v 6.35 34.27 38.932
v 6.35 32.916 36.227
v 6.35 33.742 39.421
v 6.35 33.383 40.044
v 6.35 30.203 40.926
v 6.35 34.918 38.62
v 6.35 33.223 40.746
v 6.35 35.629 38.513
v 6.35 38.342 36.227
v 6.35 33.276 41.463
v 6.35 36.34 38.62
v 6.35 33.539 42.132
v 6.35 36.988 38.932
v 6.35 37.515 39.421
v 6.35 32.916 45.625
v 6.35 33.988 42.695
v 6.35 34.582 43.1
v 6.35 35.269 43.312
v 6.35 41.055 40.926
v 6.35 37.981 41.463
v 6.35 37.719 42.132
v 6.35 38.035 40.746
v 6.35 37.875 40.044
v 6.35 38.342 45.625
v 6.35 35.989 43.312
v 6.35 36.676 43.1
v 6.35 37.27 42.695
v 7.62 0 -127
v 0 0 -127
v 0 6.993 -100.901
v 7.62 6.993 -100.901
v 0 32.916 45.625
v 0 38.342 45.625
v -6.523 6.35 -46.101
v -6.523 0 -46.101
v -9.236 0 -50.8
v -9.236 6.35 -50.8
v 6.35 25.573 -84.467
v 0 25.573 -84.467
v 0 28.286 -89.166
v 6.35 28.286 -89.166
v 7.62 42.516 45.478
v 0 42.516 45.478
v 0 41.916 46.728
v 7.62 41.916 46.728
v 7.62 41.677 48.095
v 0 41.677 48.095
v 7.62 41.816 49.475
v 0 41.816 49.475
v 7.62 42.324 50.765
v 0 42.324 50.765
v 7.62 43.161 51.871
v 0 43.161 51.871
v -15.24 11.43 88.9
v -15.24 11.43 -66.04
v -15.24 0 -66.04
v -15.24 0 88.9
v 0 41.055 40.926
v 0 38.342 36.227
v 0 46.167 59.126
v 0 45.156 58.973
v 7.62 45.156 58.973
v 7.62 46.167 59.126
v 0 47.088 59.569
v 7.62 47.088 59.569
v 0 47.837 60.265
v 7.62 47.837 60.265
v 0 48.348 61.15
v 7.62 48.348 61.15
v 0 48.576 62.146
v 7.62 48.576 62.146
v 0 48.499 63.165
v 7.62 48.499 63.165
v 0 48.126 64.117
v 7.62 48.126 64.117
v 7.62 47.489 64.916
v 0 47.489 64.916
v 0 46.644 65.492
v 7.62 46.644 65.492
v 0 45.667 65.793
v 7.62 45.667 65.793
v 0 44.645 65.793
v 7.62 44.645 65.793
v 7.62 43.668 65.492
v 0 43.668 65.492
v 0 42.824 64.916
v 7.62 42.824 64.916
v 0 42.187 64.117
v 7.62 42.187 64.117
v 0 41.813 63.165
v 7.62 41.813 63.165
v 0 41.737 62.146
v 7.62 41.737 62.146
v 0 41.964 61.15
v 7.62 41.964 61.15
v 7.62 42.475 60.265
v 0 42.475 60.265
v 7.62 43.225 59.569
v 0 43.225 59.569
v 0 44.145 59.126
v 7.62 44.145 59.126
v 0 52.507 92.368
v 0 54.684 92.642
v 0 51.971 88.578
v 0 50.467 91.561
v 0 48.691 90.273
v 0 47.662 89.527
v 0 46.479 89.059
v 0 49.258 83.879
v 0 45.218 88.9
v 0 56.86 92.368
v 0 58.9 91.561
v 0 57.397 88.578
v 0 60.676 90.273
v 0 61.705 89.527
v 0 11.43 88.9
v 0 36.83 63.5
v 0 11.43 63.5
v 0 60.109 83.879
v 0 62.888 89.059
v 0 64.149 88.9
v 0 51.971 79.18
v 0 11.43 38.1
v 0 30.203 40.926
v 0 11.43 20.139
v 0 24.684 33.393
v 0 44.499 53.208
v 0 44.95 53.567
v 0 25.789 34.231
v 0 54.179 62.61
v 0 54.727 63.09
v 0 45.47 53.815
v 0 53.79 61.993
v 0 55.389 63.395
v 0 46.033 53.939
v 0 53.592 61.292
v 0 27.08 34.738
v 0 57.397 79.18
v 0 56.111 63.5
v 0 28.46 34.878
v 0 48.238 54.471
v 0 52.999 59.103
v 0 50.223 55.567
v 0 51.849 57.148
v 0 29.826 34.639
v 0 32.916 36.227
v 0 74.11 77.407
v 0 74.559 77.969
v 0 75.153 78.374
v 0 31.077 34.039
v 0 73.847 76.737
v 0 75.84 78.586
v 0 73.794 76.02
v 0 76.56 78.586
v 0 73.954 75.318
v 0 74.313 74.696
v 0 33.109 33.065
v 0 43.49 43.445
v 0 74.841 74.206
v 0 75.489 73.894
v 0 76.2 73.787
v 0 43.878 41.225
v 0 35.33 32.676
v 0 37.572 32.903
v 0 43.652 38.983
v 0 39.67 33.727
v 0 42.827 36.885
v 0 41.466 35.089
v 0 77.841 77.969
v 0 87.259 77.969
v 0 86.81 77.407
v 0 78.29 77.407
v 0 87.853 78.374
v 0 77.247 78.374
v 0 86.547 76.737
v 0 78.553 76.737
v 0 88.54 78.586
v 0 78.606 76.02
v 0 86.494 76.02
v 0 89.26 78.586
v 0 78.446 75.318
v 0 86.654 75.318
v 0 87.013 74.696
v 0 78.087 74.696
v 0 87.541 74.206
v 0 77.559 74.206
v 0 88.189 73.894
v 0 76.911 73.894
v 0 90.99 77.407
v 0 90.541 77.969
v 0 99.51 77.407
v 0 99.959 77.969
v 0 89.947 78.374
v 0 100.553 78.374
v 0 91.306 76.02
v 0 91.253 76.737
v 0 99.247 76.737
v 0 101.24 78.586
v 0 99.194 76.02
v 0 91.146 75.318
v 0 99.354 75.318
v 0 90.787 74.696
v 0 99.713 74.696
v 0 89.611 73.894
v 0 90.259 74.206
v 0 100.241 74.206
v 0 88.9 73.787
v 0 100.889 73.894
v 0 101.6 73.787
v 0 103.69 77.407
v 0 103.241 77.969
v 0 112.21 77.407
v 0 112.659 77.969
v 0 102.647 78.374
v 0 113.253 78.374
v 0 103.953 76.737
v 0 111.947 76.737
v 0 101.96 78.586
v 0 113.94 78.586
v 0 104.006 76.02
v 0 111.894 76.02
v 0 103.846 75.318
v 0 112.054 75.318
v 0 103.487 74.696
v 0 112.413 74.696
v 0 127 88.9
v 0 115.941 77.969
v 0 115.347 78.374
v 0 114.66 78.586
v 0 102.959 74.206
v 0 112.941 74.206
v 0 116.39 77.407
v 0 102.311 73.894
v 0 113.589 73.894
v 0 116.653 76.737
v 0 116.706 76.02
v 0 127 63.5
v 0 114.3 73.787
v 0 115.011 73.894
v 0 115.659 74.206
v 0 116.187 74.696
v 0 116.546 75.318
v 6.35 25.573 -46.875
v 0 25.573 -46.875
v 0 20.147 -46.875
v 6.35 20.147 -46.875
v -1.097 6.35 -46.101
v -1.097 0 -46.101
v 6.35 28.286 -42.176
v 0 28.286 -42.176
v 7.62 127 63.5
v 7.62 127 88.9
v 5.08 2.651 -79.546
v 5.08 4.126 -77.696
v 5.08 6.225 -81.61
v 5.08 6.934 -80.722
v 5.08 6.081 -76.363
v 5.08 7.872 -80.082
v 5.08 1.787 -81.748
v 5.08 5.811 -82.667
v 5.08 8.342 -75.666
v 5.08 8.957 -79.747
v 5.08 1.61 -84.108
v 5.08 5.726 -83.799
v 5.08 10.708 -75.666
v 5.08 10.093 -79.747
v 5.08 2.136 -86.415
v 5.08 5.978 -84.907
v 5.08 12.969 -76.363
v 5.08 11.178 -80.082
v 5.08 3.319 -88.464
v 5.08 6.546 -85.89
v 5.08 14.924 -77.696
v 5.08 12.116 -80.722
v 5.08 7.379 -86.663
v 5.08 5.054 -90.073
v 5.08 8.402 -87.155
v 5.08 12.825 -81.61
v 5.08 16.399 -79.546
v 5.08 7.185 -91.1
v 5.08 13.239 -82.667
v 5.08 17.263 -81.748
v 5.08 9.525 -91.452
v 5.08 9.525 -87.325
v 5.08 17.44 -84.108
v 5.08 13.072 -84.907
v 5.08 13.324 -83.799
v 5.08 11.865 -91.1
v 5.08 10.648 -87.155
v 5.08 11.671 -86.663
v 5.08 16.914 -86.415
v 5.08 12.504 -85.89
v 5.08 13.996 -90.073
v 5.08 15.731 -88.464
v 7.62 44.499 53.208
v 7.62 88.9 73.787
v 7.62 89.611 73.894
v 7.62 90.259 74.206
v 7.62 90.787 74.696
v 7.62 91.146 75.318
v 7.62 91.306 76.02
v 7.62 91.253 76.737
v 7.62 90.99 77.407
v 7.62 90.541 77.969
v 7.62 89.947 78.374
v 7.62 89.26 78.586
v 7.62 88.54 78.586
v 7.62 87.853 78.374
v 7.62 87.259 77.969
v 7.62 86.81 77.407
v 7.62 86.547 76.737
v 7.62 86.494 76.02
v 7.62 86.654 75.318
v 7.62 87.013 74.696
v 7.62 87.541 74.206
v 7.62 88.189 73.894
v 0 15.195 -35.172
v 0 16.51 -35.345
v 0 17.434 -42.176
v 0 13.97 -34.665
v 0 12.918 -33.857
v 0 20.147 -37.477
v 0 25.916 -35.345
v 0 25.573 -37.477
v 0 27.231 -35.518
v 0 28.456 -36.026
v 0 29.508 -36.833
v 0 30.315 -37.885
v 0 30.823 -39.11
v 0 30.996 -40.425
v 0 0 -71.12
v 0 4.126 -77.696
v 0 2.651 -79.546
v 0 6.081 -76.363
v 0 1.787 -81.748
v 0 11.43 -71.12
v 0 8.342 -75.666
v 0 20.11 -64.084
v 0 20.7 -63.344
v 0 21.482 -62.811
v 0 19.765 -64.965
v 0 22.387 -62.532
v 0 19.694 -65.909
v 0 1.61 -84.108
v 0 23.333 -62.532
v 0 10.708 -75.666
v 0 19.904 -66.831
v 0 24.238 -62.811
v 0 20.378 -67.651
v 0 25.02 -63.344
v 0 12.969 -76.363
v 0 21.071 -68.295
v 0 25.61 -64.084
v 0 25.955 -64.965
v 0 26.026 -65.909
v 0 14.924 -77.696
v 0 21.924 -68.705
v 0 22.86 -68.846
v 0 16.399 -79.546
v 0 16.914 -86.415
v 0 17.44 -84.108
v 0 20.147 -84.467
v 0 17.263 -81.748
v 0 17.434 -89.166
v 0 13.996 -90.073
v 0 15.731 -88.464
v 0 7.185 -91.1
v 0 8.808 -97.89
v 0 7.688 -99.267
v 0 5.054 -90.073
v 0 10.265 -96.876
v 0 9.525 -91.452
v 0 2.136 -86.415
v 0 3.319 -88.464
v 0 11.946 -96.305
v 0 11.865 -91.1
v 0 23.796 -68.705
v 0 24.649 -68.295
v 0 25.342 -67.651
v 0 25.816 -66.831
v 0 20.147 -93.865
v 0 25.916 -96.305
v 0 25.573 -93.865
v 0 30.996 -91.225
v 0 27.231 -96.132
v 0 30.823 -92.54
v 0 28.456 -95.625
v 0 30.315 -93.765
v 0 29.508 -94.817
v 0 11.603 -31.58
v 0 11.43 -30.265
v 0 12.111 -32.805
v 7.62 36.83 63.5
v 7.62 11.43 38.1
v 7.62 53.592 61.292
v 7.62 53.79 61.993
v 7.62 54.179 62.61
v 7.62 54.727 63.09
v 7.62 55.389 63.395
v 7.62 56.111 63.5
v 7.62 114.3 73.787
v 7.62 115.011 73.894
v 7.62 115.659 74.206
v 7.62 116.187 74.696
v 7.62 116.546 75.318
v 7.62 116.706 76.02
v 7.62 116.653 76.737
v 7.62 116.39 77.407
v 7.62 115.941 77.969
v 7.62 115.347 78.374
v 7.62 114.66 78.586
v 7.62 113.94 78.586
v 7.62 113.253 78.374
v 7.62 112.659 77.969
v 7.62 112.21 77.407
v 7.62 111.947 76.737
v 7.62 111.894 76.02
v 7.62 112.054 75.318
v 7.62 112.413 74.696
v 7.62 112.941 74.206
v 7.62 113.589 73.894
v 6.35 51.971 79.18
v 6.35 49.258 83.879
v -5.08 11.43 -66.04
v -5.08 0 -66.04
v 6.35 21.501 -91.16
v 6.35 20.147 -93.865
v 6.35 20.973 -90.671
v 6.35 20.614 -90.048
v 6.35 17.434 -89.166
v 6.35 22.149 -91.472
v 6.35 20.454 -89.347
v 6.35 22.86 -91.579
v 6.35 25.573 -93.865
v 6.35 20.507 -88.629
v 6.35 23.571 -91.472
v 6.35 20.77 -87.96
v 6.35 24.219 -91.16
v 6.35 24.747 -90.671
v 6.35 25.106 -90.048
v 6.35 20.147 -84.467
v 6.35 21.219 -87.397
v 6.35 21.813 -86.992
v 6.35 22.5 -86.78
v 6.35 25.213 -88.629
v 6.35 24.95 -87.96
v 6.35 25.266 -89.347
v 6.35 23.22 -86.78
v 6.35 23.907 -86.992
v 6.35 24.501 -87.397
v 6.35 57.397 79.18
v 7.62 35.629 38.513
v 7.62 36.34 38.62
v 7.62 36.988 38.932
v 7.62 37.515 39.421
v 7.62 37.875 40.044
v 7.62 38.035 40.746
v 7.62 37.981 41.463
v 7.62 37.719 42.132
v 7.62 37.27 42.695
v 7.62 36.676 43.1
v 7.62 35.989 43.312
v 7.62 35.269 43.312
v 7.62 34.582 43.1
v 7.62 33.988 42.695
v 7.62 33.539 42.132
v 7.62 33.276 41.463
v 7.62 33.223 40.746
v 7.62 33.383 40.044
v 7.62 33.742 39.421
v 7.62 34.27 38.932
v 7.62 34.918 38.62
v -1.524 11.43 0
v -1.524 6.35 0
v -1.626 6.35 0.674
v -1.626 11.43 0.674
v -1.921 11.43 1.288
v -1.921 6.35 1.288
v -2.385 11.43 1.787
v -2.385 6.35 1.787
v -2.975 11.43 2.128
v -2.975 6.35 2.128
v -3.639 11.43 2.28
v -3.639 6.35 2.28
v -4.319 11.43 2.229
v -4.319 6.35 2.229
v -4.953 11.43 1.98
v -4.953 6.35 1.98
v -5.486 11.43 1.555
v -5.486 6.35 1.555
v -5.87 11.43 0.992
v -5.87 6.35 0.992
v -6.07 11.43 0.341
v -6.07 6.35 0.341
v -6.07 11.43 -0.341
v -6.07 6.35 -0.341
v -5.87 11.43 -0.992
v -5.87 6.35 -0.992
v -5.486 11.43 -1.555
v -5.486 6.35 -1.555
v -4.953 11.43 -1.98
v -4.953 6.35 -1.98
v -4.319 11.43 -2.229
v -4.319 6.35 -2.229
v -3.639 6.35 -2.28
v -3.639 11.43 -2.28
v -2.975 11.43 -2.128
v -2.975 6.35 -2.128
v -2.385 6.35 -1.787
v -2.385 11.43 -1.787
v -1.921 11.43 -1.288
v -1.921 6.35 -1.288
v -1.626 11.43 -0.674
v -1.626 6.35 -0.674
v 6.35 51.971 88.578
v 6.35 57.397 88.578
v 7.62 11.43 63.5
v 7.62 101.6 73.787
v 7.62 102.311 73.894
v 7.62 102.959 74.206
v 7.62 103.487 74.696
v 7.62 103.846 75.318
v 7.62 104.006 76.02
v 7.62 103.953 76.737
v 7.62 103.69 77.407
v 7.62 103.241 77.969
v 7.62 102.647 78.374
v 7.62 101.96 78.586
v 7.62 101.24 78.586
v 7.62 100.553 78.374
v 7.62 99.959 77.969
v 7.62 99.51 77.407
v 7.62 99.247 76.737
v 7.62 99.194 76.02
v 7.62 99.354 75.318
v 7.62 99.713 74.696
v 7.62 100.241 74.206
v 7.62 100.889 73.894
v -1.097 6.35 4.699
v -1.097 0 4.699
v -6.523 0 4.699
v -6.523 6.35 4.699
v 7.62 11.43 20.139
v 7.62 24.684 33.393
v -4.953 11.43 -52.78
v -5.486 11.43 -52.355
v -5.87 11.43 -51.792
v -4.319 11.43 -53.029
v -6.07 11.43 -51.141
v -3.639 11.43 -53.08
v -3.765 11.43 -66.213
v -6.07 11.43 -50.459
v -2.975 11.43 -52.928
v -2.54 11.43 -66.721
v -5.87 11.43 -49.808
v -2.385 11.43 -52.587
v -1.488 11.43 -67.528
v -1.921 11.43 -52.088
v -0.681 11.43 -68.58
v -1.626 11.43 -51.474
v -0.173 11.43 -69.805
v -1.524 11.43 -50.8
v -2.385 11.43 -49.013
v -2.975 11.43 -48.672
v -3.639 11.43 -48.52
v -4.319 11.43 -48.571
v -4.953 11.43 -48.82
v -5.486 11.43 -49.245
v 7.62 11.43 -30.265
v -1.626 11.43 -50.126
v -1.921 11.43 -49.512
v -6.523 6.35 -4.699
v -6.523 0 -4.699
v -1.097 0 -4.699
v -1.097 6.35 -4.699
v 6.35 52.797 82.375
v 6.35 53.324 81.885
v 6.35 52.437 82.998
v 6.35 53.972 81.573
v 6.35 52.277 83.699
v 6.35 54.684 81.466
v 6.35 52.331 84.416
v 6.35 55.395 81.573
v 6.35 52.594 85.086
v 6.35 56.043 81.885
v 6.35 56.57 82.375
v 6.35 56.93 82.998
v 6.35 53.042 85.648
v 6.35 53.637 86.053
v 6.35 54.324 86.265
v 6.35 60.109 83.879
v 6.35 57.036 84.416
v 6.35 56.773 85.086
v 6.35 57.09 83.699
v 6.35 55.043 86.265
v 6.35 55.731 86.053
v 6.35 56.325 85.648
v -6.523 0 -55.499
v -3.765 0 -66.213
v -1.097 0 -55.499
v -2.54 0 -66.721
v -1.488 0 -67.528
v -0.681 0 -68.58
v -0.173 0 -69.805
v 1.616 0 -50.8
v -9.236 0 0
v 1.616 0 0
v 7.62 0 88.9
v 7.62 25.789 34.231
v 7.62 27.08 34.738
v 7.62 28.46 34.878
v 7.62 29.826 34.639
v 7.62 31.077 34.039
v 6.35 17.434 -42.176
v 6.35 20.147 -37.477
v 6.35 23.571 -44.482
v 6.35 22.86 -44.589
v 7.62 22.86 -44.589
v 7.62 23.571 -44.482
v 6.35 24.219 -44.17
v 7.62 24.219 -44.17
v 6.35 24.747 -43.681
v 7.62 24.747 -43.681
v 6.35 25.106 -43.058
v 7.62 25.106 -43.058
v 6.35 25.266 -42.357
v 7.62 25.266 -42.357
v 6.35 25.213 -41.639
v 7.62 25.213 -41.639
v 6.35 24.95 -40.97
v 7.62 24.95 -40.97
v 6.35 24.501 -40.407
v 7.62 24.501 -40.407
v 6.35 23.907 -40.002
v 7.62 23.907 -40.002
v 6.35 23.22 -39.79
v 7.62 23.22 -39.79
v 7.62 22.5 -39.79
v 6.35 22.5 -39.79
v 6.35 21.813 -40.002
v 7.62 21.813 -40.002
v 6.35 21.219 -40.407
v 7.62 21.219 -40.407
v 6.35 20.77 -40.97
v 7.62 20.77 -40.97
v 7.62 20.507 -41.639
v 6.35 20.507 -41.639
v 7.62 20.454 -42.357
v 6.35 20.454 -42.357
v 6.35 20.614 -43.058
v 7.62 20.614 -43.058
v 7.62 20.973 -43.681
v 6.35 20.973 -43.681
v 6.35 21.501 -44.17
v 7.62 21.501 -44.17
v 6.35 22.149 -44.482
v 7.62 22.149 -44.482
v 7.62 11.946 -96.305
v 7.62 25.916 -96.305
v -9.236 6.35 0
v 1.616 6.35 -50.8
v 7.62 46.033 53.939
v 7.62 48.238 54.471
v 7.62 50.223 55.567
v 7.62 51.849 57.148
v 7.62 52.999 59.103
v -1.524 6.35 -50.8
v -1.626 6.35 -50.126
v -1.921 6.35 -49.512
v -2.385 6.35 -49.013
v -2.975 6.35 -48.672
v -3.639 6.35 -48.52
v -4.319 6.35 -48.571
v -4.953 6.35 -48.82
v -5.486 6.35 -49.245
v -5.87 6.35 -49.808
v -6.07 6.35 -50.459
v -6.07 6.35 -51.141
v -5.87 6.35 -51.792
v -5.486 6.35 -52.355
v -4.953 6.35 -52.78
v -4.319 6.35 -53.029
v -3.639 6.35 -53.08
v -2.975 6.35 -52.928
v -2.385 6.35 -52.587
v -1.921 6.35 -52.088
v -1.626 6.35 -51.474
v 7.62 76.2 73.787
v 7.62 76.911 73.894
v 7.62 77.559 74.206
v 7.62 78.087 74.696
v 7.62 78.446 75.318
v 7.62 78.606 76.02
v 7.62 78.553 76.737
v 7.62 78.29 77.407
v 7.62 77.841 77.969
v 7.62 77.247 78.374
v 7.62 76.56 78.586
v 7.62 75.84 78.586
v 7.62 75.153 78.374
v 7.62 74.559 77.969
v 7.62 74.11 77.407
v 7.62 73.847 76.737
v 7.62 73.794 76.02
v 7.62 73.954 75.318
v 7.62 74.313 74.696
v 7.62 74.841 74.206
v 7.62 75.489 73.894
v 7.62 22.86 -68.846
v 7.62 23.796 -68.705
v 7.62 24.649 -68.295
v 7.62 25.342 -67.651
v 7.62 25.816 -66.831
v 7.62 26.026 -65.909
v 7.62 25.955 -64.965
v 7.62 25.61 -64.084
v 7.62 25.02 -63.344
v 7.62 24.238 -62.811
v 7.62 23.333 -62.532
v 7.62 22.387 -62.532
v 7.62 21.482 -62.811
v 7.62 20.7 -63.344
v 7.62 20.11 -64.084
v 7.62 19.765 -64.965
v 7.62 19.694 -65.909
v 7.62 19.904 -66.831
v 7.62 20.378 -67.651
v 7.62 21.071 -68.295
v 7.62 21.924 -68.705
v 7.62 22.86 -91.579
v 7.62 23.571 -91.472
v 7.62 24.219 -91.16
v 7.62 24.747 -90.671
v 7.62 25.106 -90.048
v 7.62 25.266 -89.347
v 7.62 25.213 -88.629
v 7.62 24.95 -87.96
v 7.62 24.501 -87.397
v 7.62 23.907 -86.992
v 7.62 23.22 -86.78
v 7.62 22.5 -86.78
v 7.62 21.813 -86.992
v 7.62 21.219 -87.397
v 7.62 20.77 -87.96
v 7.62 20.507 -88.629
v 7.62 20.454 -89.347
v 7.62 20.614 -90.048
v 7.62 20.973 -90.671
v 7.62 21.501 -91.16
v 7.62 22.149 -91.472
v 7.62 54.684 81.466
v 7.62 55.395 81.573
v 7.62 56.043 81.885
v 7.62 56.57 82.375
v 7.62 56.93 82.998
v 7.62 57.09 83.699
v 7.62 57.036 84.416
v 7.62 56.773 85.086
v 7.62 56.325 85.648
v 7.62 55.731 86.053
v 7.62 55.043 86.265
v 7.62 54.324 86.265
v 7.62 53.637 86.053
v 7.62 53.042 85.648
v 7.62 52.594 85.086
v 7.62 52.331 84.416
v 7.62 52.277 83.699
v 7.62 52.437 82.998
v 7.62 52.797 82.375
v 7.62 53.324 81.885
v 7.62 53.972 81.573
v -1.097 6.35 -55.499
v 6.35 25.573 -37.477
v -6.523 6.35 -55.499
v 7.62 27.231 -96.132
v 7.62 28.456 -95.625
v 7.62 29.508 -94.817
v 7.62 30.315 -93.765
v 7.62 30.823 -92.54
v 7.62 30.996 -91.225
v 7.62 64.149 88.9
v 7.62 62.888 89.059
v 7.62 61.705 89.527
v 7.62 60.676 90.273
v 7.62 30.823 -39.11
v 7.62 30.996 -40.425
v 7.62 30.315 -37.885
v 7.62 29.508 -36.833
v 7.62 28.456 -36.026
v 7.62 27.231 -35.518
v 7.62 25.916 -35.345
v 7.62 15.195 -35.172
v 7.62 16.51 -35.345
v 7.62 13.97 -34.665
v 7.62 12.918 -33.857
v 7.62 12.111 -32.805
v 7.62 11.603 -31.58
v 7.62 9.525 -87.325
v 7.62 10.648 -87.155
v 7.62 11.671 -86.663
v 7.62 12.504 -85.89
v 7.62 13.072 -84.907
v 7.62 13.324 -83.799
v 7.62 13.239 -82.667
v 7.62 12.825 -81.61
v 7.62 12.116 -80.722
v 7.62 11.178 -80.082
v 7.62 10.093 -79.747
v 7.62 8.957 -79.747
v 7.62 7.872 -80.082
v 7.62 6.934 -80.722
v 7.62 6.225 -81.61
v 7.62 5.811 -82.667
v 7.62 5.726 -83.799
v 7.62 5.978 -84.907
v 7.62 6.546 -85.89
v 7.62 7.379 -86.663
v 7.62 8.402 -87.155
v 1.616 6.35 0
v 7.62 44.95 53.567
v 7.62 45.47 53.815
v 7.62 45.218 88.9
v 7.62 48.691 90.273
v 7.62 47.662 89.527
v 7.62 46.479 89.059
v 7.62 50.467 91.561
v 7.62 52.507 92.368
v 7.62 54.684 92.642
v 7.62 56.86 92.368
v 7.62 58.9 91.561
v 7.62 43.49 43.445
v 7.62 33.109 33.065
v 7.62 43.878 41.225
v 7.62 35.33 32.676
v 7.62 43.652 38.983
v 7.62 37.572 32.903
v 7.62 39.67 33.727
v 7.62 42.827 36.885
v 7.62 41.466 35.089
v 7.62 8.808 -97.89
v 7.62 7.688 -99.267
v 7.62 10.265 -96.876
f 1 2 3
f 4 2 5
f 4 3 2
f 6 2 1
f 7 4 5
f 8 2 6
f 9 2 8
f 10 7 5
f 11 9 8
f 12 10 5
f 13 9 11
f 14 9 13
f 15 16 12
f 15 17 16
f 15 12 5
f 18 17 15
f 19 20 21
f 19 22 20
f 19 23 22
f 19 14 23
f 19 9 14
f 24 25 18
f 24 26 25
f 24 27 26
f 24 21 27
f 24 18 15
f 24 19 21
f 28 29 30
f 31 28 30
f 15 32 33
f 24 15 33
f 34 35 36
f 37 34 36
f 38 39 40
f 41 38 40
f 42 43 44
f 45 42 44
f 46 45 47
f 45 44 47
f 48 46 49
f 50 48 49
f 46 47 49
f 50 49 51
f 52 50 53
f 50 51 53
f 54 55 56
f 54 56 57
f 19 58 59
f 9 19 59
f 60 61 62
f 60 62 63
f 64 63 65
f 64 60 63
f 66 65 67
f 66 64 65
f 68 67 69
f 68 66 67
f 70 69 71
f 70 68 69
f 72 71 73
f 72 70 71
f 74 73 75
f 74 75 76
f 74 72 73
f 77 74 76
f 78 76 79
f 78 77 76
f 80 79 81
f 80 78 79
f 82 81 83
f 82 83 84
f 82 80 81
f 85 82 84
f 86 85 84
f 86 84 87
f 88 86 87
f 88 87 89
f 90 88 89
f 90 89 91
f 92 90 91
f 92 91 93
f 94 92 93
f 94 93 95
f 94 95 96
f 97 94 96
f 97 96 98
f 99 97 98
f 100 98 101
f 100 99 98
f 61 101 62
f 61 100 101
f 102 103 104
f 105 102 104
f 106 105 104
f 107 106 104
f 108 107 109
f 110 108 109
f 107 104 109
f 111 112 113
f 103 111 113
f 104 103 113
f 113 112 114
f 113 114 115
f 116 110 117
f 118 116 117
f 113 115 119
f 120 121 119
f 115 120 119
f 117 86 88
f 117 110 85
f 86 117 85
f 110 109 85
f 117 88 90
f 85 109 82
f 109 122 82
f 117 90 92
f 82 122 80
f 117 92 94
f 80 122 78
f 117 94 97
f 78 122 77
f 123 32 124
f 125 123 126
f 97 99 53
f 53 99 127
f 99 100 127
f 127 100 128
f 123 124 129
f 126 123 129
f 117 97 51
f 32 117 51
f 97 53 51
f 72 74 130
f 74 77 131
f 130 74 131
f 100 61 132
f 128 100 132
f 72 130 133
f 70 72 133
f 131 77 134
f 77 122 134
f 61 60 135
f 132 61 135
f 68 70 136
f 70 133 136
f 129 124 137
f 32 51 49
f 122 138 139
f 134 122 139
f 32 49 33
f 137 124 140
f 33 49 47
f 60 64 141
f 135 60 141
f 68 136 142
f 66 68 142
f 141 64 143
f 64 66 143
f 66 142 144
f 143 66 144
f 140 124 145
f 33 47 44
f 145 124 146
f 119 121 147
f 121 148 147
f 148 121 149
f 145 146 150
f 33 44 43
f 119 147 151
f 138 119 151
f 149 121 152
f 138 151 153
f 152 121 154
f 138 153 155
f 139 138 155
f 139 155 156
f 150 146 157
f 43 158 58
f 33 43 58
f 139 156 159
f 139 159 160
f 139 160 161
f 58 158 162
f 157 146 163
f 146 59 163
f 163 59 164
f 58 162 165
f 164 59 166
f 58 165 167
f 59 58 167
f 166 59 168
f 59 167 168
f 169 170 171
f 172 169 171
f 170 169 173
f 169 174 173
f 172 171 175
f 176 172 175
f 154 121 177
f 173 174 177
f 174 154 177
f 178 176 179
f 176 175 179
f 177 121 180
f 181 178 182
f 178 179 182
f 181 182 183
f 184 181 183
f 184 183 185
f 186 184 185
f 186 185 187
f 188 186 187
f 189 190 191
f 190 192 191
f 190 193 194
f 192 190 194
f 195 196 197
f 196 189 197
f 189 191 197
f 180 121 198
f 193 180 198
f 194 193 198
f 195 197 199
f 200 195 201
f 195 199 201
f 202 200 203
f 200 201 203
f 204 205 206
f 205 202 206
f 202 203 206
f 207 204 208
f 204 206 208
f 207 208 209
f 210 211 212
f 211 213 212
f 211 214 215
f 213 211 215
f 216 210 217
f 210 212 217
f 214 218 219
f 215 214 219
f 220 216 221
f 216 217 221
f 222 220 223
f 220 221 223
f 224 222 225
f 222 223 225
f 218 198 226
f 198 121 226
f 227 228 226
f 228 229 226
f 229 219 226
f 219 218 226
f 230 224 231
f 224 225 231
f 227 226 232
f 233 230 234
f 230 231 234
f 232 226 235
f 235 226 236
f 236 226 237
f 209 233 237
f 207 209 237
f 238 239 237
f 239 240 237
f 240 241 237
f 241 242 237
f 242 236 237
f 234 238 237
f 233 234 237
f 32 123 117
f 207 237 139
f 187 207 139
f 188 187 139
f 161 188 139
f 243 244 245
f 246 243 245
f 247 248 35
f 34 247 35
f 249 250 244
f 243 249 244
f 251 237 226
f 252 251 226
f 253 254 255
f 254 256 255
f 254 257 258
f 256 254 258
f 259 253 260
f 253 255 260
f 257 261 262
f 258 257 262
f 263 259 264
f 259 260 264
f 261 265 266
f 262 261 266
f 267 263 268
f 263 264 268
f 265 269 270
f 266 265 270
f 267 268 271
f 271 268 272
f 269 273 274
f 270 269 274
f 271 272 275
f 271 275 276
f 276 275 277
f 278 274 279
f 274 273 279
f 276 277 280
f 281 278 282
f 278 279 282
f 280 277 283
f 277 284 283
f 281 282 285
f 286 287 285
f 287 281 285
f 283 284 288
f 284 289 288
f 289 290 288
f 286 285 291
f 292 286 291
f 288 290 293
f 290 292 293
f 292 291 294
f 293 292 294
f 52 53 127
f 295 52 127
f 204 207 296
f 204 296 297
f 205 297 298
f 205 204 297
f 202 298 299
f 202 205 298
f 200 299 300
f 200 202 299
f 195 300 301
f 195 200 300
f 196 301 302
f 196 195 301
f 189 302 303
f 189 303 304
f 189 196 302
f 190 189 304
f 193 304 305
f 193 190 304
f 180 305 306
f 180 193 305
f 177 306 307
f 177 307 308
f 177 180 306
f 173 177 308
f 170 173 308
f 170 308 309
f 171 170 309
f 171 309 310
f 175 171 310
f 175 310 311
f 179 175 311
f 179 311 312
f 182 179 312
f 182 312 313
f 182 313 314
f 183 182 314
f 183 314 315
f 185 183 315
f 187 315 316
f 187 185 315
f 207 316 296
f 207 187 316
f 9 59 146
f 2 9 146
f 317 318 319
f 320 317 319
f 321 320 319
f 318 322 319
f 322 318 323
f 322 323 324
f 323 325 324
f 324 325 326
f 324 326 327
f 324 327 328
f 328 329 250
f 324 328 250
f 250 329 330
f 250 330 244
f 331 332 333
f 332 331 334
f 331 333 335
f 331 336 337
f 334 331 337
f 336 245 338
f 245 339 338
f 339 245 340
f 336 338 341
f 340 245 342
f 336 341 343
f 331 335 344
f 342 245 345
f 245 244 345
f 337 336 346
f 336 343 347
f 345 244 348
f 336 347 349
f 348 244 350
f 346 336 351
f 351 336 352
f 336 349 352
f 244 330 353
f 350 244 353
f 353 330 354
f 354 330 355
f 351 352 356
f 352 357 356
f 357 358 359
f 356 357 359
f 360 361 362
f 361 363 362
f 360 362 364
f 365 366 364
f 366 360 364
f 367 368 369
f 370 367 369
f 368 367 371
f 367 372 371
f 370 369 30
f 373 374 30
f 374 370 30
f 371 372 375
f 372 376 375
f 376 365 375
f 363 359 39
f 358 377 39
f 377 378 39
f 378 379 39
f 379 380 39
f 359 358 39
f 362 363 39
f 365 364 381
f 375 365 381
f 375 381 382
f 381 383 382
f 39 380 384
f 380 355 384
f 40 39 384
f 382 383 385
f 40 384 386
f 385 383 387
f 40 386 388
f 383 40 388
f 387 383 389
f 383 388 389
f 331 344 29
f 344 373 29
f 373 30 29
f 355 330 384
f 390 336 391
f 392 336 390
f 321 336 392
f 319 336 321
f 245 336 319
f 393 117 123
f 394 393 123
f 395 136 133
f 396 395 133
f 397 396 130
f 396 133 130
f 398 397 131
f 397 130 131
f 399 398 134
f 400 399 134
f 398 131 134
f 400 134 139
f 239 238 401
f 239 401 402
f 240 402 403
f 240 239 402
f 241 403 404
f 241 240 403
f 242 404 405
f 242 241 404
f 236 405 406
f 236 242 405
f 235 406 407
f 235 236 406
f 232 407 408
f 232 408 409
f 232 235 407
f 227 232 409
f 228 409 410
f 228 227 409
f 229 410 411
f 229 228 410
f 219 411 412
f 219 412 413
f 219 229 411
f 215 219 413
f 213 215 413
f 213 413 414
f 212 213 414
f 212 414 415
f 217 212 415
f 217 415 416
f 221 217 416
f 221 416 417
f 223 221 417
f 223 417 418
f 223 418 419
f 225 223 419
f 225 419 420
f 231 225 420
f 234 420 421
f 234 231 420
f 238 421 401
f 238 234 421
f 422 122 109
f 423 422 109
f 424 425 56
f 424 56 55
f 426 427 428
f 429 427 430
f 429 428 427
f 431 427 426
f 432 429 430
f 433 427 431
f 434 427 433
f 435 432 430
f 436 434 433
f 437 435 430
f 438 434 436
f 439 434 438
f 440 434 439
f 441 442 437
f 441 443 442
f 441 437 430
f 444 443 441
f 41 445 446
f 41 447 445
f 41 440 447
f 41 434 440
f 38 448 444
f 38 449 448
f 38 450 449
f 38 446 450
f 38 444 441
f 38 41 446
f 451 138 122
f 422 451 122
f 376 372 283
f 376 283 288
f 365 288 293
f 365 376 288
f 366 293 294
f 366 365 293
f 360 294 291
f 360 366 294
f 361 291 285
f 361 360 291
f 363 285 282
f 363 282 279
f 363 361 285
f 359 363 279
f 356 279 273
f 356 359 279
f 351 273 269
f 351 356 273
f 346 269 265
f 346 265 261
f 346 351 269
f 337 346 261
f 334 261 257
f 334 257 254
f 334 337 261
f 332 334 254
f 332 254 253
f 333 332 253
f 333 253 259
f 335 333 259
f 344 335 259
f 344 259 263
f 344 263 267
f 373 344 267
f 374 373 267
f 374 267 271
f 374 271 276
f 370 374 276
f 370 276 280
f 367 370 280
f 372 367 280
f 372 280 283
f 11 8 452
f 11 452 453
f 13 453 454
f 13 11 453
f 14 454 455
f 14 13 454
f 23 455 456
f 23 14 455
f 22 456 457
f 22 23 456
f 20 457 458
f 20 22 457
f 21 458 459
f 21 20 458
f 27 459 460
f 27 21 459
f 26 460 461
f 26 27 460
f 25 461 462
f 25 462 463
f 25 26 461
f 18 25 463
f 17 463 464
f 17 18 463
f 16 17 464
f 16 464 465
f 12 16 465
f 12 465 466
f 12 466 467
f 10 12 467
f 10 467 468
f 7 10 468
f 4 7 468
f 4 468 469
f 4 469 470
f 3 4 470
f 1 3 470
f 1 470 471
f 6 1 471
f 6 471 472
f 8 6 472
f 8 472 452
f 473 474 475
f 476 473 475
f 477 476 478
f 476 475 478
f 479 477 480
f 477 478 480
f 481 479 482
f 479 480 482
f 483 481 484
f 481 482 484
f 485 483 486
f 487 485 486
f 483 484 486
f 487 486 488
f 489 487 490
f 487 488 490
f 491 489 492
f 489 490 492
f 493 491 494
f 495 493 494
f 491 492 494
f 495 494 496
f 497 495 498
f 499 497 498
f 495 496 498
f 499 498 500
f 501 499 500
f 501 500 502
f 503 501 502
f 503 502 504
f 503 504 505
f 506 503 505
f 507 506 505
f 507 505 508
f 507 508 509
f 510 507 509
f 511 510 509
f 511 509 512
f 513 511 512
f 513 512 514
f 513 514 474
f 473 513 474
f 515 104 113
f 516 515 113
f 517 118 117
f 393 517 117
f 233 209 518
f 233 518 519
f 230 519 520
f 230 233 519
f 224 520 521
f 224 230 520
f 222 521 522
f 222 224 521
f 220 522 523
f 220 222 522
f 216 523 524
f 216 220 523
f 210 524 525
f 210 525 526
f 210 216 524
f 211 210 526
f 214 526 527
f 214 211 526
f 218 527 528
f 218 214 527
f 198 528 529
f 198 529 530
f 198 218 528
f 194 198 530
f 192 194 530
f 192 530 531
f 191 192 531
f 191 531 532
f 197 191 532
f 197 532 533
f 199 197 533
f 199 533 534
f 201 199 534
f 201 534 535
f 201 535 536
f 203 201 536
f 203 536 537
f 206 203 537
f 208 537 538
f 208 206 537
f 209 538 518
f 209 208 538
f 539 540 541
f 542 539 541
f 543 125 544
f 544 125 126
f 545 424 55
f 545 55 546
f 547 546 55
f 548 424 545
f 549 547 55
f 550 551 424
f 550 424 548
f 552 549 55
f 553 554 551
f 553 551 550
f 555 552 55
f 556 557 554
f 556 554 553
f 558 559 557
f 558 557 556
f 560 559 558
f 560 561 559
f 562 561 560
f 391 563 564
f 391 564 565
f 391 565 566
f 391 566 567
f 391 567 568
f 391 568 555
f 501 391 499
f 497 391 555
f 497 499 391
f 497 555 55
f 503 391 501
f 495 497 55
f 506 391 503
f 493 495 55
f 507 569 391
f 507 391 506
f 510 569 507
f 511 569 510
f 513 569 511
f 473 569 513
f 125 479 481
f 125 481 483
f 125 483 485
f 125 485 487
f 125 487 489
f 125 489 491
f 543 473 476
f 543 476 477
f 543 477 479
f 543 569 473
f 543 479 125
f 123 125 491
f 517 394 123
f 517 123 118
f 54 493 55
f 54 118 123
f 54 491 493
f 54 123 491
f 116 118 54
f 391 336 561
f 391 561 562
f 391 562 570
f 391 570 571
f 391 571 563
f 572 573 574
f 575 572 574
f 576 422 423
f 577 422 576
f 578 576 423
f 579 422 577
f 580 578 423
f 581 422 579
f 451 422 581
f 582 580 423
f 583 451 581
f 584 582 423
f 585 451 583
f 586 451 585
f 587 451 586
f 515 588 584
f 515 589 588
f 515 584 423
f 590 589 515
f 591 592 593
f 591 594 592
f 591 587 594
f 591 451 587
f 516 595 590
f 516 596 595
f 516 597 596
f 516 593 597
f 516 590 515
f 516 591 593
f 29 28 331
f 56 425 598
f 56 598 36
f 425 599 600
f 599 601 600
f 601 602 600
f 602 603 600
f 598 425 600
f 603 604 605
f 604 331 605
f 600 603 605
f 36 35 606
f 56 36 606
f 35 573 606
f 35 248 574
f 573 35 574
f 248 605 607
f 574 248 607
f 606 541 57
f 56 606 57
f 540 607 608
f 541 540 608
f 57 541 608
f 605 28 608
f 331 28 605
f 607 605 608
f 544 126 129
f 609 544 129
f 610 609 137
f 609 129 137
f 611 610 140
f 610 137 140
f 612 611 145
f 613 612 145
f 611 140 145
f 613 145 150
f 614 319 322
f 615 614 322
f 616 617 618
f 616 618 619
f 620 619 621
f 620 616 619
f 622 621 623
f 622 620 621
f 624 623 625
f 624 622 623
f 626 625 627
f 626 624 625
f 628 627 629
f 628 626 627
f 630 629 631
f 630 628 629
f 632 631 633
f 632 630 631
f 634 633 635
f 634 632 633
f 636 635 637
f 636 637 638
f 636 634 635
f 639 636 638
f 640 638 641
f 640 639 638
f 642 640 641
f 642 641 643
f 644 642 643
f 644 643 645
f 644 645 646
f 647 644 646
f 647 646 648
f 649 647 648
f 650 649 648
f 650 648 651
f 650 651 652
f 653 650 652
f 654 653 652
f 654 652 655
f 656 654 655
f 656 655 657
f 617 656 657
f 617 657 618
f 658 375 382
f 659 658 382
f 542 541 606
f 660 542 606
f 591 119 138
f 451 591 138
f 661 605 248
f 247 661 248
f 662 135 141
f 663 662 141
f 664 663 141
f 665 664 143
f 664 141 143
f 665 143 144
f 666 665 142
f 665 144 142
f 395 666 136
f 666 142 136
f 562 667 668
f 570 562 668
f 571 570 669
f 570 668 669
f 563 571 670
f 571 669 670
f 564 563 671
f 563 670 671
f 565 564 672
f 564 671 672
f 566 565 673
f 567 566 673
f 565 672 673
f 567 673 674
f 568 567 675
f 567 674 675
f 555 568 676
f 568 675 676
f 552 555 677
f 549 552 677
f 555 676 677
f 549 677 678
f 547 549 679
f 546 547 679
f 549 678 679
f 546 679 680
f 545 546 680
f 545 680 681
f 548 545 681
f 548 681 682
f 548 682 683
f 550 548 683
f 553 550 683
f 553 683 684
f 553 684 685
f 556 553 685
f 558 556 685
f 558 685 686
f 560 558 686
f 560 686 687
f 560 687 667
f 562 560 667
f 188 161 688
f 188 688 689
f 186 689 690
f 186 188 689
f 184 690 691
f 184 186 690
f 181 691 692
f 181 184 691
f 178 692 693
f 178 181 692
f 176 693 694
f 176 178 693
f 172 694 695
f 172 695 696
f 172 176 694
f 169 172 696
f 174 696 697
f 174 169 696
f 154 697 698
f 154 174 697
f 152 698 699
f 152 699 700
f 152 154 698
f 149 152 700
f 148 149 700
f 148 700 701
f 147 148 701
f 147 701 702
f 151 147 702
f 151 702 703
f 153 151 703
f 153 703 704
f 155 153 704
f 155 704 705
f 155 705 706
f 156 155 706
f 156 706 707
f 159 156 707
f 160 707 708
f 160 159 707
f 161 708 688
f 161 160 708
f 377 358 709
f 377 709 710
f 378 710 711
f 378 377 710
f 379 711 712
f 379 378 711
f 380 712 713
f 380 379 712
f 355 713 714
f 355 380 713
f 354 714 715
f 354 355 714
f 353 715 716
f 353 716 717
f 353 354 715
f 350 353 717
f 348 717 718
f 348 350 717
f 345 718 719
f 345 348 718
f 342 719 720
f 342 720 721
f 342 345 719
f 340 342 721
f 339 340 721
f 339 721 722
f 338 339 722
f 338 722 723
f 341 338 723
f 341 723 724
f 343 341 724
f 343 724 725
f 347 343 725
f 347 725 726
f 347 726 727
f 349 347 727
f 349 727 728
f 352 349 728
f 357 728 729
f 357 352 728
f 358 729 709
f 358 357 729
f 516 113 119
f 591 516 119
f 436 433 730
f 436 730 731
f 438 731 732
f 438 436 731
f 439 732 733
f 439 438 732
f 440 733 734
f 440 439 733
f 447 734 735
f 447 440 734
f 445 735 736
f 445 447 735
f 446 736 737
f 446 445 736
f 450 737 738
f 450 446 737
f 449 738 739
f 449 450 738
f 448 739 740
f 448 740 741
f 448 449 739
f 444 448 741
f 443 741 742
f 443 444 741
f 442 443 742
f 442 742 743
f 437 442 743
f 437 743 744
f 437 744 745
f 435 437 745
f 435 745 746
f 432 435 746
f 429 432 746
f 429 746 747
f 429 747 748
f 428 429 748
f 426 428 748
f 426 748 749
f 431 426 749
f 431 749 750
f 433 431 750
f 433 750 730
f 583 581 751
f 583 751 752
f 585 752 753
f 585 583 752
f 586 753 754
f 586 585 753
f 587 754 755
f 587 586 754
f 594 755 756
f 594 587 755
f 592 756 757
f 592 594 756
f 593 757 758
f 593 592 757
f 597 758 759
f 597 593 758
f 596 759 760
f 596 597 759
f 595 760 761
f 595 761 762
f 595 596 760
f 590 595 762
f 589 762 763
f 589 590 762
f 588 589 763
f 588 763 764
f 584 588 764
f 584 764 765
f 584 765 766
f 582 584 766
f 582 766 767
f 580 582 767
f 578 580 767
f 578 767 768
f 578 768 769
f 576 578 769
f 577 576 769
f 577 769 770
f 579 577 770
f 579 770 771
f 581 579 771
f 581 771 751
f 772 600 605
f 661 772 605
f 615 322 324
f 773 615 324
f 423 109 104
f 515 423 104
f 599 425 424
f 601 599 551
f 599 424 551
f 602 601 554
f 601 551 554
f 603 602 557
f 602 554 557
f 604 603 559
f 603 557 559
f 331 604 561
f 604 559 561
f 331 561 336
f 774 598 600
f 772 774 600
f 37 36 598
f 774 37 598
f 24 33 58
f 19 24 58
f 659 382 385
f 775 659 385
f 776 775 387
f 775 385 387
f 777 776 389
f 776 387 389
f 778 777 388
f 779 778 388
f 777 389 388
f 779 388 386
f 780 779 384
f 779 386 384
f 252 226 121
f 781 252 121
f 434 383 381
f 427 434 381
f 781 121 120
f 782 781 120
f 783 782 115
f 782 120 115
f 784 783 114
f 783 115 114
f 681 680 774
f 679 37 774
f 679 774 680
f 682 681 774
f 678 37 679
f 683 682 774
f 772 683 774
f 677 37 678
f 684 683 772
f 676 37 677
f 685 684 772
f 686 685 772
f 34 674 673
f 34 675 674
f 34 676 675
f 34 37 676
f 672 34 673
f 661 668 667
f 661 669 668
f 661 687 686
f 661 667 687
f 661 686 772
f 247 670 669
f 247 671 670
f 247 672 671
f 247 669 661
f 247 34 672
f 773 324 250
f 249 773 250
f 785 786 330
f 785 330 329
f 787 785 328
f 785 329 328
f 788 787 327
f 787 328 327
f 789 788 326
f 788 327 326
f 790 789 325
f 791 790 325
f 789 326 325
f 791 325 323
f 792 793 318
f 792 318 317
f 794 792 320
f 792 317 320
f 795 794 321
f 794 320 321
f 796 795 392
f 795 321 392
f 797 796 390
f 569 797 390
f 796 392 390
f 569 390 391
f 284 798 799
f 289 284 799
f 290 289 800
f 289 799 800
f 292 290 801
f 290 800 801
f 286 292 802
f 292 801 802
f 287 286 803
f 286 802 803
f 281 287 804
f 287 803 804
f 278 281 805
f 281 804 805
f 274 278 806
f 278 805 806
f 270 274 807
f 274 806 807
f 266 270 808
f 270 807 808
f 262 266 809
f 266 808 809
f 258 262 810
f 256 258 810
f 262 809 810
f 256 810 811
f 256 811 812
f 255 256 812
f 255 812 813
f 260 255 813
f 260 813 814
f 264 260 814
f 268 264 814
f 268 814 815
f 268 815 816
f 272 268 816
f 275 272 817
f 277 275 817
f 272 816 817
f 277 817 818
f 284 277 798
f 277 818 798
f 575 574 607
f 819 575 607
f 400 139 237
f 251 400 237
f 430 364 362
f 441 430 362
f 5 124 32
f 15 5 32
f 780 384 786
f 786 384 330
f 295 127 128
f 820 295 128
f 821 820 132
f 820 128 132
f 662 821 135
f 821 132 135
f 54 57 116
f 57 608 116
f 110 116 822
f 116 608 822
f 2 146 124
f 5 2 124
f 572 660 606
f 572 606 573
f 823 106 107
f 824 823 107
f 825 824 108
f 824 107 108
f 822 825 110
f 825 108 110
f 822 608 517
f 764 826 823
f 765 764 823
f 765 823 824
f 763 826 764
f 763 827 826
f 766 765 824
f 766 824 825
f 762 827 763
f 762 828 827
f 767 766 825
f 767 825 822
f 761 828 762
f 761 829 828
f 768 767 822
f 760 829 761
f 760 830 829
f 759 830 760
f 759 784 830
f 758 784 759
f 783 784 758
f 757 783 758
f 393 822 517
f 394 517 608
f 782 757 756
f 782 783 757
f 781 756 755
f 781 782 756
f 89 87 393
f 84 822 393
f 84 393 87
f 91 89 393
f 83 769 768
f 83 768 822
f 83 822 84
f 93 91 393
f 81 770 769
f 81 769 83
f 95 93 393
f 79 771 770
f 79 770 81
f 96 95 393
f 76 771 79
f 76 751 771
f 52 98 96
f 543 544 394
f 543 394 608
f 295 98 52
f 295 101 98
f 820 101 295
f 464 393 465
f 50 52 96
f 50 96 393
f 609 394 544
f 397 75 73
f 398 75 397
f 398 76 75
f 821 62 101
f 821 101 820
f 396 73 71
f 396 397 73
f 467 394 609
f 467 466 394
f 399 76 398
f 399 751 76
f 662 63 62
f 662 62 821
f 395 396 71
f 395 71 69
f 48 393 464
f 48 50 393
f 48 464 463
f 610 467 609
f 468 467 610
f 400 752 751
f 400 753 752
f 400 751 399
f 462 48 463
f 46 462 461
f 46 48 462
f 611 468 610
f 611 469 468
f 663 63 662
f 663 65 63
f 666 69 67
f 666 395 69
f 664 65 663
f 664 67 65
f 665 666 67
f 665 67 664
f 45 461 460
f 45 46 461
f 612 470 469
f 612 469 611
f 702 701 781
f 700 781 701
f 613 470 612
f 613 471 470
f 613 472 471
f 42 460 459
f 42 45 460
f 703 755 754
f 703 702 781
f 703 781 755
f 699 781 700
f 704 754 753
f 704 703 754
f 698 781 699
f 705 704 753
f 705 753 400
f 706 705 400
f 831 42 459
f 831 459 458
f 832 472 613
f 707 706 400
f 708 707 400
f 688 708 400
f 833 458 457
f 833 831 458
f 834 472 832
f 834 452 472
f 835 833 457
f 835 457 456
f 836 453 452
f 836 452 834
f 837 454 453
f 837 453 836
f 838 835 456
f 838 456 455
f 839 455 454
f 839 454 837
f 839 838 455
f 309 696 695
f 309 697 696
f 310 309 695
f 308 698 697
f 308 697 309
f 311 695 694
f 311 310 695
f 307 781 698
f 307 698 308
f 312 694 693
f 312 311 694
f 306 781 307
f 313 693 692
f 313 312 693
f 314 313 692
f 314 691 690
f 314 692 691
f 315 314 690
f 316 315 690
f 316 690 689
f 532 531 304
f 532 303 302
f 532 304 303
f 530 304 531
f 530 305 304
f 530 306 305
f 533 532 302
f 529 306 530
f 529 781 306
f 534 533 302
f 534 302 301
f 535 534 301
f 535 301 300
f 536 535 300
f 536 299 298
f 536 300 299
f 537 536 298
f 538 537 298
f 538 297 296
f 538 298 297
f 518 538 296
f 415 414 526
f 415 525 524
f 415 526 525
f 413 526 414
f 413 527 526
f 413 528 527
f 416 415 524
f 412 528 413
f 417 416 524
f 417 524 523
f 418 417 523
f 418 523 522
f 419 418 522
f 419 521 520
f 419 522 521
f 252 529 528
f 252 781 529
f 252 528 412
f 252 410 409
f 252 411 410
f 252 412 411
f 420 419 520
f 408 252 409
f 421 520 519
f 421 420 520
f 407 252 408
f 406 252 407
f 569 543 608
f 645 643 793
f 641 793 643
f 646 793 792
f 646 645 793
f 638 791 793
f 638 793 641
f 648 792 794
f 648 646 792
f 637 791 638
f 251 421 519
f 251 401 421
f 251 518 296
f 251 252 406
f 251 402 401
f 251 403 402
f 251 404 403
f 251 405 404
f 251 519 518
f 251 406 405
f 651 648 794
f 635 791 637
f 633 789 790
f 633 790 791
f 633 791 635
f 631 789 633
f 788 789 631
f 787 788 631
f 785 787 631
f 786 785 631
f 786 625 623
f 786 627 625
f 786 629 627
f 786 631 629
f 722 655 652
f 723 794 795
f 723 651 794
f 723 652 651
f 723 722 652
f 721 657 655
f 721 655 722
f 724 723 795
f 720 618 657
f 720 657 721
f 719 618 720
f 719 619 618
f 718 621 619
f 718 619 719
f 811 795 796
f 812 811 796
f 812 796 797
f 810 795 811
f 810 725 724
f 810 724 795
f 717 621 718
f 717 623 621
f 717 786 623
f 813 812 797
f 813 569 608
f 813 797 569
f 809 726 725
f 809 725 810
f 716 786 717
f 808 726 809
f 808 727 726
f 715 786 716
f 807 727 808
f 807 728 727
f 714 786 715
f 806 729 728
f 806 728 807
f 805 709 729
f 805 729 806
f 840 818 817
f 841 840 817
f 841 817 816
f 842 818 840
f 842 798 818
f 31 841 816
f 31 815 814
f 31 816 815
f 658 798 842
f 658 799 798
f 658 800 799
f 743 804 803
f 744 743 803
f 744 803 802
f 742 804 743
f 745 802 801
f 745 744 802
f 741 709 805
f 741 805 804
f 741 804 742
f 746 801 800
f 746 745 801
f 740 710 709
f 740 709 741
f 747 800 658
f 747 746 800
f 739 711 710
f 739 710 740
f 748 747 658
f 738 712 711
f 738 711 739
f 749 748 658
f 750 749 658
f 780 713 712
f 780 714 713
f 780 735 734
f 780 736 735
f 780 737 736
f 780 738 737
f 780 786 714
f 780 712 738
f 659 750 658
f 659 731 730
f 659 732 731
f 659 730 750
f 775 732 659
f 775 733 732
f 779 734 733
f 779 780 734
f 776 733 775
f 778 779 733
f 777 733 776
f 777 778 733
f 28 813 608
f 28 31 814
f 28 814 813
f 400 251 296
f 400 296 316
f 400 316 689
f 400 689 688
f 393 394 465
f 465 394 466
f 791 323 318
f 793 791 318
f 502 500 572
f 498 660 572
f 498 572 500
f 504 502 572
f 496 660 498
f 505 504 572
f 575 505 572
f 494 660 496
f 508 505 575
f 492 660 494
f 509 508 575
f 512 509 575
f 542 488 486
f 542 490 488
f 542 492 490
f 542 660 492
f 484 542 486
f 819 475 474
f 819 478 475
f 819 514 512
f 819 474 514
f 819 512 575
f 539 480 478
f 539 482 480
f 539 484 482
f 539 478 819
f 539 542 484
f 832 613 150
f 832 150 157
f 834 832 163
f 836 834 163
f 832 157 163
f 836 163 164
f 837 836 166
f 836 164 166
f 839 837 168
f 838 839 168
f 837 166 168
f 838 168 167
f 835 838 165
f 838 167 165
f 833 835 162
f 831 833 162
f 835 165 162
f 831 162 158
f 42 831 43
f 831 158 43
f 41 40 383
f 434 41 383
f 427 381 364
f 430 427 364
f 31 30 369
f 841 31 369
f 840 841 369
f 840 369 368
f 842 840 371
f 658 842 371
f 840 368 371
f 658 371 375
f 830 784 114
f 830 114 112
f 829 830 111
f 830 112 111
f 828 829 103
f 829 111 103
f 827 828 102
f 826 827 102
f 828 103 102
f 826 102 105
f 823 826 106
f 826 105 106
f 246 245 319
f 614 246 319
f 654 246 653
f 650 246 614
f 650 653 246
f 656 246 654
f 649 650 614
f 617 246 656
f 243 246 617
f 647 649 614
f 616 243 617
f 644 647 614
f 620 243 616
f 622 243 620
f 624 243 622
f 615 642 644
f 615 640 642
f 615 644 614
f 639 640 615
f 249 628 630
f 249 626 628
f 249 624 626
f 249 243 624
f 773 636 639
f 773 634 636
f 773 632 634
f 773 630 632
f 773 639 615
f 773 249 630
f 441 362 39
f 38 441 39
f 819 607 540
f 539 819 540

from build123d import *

# Parameters (mm, degrees)
SKETCH1_R           = 7.9375
SKETCH1_R_2         = 2.413
SKETCH1_R_3         = 3.175
SKETCH1_R_4         = 3.429
BOSS_EXTRUDE1_DEPTH = 7.62
SKETCH2_R           = 7.9375
SKETCH2_R_2         = 3.81
BOSS_EXTRUDE2_DEPTH = 2.54
SKETCH3_W           = 154.94
SKETCH3_H           = 11.43
BOSS_EXTRUDE3_DEPTH = 15.24
FILLET1_R           = 5.08
SKETCH5_R           = 2.286
CUT_EXTRUDE1_DEPTH  = 128
CUT_EXTRUDE2_DEPTH  = 6.35
CUT_EXTRUDE3_DEPTH  = 6.35


with BuildPart() as part:
    # Sketch1 → Boss-Extrude1 (new body)
    with BuildSketch(Plane(origin=(0, 0, 0), x_dir=(0, 0, -1), z_dir=(1, 0, 0))):
        with BuildLine():
            Line((0, 0), (127, 0))
            Line((127, 0), (100.900837488, 6.993249518))
            ThreePointArc((100.900837488, 6.993249518), (97.889599245, 8.807630529), (96.305117976, 11.94593474))
            Line((96.305117976, 11.94593474), (96.305117976, 25.91593474))
            ThreePointArc((96.305117976, 25.91593474), (94.817220425, 29.508037188), (91.225117976, 30.99593474))
            Line((91.225117976, 30.99593474), (40.425117976, 30.99593474))
            ThreePointArc((40.425117976, 30.99593474), (36.833015528, 29.508037188), (35.345117976, 25.91593474))
            Line((35.345117976, 25.91593474), (35.345117976, 16.51))
            ThreePointArc((35.345117976, 16.51), (33.857220425, 12.917897552), (30.265117976, 11.43))
            Line((30.265117976, 11.43), (0, 11.43))
            Line((0, 11.43), (-20.139487758, 11.43))
            Line((-20.139487758, 11.43), (-33.393348427, 24.683860669))
            ThreePointArc((-33.393348427, 24.683860669), (-34.855521636, 27.76537759), (-34.039193709, 31.077069869))
            ThreePointArc((-34.039193709, 31.077069869), (-35.088692293, 41.466034818), (-45.477657242, 42.515533402))
            ThreePointArc((-45.477657242, 42.515533402), (-48.789349521, 41.699205475), (-51.870866442, 43.161378684))
            Line((-51.870866442, 43.161378684), (-53.208352597, 44.49886484))
            ThreePointArc((-53.208352597, 44.49886484), (-53.705674947, 45.203111295), (-53.938776392, 46.033145213))
            ThreePointArc((-53.938776392, 46.033145213), (-56.302994281, 51.089129932), (-61.291601771, 53.592388411))
            ThreePointArc((-61.291601771, 53.592388411), (-62.869694805, 54.435936137), (-63.5, 56.110649769))
            Line((-63.5, 56.110649769), (-63.5, 127))
            Line((-63.5, 127), (-88.9, 127))
            Line((-88.9, 127), (-88.9, 64.149284844))
            ThreePointArc((-88.9, 64.149284844), (-89.255767512, 62.281658704), (-90.273239134, 60.675623392))
            ThreePointArc((-90.273239134, 60.675623392), (-92.64207664, 54.683557387), (-90.273239134, 48.691491383))
            ThreePointArc((-90.273239134, 48.691491383), (-89.255767512, 47.085456071), (-88.9, 45.217829931))
            Line((-88.9, 45.217829931), (-88.9, 0))
            Line((-88.9, 0), (0, 0))
        make_face()
        with Locations((83.514716058, 9.525)):
            Circle(SKETCH1_R, mode=Mode.SUBTRACT)
        with Locations((-76.2, 114.3)):
            Circle(SKETCH1_R_2, mode=Mode.SUBTRACT)
        with Locations((-76.2, 88.9)):
            Circle(SKETCH1_R_2, mode=Mode.SUBTRACT)
        with Locations((-76.2, 101.6)):
            Circle(SKETCH1_R_2, mode=Mode.SUBTRACT)
        with Locations((-76.2, 76.2)):
            Circle(SKETCH1_R_2, mode=Mode.SUBTRACT)
        with Locations((65.671256734, 22.86)):
            Circle(SKETCH1_R_3, mode=Mode.SUBTRACT)
        with Locations((-62.402467706, 45.156212864)):
            Circle(SKETCH1_R_4, mode=Mode.SUBTRACT)
        with Locations((42.176256734, 22.86)):
            Circle(SKETCH1_R_2, mode=Mode.SUBTRACT)
        with Locations((89.166256734, 22.86)):
            Circle(SKETCH1_R_2, mode=Mode.SUBTRACT)
        with Locations((-83.87907664, 54.683557387)):
            Circle(SKETCH1_R_2, mode=Mode.SUBTRACT)
        with Locations((-40.925858771, 35.62886834)):
            Circle(SKETCH1_R_2, mode=Mode.SUBTRACT)
        Polygon((-63.5, 11.43), (-63.5, 36.83), (-38.1, 11.43), align=None, mode=Mode.SUBTRACT)
    extrude(amount=BOSS_EXTRUDE1_DEPTH)

    # Sketch2 → Boss-Extrude2 (add)
    with BuildSketch(Plane(origin=(7.62, 0, 0), x_dir=(0, 0, -1), z_dir=(1, 0, 0))):
        with Locations((83.514716058, 9.525)):
            Circle(SKETCH2_R)
        with Locations((83.514716058, 9.525)):
            Circle(SKETCH2_R_2, mode=Mode.SUBTRACT)
    extrude(amount=-BOSS_EXTRUDE2_DEPTH)

    # Sketch3 → Boss-Extrude3 (add)
    with BuildSketch(Plane.ZY):
        with Locations((11.43, 5.715)):
            Rectangle(SKETCH3_W, SKETCH3_H)
    extrude(amount=BOSS_EXTRUDE3_DEPTH)

    # Fillet1
    fillet1_edges = [part.edges().sort_by_distance(p)[0] for p in [
        (0, 5.715, -66.04),
    ]]
    fillet(fillet1_edges, radius=FILLET1_R)

    # Sketch5 → Cut-Extrude1 (cut, through all)
    with BuildSketch(Plane.XZ):
        with Locations((-3.81, -50.8)):
            Circle(SKETCH5_R)
        with Locations((-3.81, 0)):
            Circle(SKETCH5_R)
    extrude(amount=-CUT_EXTRUDE1_DEPTH, mode=Mode.SUBTRACT)

    # Sketch6 → Cut-Extrude2 (cut)
    with BuildSketch(Plane.XZ):
        Polygon((1.61593783, -50.8), (-1.097031085, -46.101), (-6.522968915, -46.101), (-9.23593783, -50.8), (-6.522968915, -55.499), (-1.097031085, -55.499), align=None)
        Polygon((-1.097031085, -4.699), (1.61593783, 0), (-1.097031085, 4.699), (-6.522968915, 4.699), (-9.23593783, 0), (-6.522968915, -4.699), align=None)
    extrude(amount=-CUT_EXTRUDE2_DEPTH, mode=Mode.SUBTRACT)

    # Sketch7 → Cut-Extrude3 (cut)
    with BuildSketch(Plane.ZY):
        Polygon((-84.467256734, 25.572968915), (-89.166256734, 28.28593783), (-93.865256734, 25.572968915), (-93.865256734, 20.147031085), (-89.166256734, 17.43406217), (-84.467256734, 20.147031085), align=None)
        Polygon((-37.477256734, 25.572968915), (-42.176256734, 28.28593783), (-46.875256734, 25.572968915), (-46.875256734, 20.147031085), (-42.176256734, 17.43406217), (-37.477256734, 20.147031085), align=None)
        Polygon((45.624858771, 38.341837255), (40.925858771, 41.054806169), (36.226858771, 38.341837255), (36.226858771, 32.915899425), (40.925858771, 30.20293051), (45.624858771, 32.915899425), align=None)
        Polygon((88.57807664, 57.396526302), (83.87907664, 60.109495217), (79.18007664, 57.396526302), (79.18007664, 51.970588472), (83.87907664, 49.257619558), (88.57807664, 51.970588472), align=None)
    extrude(amount=-CUT_EXTRUDE3_DEPTH, mode=Mode.SUBTRACT)


solid = part.part
